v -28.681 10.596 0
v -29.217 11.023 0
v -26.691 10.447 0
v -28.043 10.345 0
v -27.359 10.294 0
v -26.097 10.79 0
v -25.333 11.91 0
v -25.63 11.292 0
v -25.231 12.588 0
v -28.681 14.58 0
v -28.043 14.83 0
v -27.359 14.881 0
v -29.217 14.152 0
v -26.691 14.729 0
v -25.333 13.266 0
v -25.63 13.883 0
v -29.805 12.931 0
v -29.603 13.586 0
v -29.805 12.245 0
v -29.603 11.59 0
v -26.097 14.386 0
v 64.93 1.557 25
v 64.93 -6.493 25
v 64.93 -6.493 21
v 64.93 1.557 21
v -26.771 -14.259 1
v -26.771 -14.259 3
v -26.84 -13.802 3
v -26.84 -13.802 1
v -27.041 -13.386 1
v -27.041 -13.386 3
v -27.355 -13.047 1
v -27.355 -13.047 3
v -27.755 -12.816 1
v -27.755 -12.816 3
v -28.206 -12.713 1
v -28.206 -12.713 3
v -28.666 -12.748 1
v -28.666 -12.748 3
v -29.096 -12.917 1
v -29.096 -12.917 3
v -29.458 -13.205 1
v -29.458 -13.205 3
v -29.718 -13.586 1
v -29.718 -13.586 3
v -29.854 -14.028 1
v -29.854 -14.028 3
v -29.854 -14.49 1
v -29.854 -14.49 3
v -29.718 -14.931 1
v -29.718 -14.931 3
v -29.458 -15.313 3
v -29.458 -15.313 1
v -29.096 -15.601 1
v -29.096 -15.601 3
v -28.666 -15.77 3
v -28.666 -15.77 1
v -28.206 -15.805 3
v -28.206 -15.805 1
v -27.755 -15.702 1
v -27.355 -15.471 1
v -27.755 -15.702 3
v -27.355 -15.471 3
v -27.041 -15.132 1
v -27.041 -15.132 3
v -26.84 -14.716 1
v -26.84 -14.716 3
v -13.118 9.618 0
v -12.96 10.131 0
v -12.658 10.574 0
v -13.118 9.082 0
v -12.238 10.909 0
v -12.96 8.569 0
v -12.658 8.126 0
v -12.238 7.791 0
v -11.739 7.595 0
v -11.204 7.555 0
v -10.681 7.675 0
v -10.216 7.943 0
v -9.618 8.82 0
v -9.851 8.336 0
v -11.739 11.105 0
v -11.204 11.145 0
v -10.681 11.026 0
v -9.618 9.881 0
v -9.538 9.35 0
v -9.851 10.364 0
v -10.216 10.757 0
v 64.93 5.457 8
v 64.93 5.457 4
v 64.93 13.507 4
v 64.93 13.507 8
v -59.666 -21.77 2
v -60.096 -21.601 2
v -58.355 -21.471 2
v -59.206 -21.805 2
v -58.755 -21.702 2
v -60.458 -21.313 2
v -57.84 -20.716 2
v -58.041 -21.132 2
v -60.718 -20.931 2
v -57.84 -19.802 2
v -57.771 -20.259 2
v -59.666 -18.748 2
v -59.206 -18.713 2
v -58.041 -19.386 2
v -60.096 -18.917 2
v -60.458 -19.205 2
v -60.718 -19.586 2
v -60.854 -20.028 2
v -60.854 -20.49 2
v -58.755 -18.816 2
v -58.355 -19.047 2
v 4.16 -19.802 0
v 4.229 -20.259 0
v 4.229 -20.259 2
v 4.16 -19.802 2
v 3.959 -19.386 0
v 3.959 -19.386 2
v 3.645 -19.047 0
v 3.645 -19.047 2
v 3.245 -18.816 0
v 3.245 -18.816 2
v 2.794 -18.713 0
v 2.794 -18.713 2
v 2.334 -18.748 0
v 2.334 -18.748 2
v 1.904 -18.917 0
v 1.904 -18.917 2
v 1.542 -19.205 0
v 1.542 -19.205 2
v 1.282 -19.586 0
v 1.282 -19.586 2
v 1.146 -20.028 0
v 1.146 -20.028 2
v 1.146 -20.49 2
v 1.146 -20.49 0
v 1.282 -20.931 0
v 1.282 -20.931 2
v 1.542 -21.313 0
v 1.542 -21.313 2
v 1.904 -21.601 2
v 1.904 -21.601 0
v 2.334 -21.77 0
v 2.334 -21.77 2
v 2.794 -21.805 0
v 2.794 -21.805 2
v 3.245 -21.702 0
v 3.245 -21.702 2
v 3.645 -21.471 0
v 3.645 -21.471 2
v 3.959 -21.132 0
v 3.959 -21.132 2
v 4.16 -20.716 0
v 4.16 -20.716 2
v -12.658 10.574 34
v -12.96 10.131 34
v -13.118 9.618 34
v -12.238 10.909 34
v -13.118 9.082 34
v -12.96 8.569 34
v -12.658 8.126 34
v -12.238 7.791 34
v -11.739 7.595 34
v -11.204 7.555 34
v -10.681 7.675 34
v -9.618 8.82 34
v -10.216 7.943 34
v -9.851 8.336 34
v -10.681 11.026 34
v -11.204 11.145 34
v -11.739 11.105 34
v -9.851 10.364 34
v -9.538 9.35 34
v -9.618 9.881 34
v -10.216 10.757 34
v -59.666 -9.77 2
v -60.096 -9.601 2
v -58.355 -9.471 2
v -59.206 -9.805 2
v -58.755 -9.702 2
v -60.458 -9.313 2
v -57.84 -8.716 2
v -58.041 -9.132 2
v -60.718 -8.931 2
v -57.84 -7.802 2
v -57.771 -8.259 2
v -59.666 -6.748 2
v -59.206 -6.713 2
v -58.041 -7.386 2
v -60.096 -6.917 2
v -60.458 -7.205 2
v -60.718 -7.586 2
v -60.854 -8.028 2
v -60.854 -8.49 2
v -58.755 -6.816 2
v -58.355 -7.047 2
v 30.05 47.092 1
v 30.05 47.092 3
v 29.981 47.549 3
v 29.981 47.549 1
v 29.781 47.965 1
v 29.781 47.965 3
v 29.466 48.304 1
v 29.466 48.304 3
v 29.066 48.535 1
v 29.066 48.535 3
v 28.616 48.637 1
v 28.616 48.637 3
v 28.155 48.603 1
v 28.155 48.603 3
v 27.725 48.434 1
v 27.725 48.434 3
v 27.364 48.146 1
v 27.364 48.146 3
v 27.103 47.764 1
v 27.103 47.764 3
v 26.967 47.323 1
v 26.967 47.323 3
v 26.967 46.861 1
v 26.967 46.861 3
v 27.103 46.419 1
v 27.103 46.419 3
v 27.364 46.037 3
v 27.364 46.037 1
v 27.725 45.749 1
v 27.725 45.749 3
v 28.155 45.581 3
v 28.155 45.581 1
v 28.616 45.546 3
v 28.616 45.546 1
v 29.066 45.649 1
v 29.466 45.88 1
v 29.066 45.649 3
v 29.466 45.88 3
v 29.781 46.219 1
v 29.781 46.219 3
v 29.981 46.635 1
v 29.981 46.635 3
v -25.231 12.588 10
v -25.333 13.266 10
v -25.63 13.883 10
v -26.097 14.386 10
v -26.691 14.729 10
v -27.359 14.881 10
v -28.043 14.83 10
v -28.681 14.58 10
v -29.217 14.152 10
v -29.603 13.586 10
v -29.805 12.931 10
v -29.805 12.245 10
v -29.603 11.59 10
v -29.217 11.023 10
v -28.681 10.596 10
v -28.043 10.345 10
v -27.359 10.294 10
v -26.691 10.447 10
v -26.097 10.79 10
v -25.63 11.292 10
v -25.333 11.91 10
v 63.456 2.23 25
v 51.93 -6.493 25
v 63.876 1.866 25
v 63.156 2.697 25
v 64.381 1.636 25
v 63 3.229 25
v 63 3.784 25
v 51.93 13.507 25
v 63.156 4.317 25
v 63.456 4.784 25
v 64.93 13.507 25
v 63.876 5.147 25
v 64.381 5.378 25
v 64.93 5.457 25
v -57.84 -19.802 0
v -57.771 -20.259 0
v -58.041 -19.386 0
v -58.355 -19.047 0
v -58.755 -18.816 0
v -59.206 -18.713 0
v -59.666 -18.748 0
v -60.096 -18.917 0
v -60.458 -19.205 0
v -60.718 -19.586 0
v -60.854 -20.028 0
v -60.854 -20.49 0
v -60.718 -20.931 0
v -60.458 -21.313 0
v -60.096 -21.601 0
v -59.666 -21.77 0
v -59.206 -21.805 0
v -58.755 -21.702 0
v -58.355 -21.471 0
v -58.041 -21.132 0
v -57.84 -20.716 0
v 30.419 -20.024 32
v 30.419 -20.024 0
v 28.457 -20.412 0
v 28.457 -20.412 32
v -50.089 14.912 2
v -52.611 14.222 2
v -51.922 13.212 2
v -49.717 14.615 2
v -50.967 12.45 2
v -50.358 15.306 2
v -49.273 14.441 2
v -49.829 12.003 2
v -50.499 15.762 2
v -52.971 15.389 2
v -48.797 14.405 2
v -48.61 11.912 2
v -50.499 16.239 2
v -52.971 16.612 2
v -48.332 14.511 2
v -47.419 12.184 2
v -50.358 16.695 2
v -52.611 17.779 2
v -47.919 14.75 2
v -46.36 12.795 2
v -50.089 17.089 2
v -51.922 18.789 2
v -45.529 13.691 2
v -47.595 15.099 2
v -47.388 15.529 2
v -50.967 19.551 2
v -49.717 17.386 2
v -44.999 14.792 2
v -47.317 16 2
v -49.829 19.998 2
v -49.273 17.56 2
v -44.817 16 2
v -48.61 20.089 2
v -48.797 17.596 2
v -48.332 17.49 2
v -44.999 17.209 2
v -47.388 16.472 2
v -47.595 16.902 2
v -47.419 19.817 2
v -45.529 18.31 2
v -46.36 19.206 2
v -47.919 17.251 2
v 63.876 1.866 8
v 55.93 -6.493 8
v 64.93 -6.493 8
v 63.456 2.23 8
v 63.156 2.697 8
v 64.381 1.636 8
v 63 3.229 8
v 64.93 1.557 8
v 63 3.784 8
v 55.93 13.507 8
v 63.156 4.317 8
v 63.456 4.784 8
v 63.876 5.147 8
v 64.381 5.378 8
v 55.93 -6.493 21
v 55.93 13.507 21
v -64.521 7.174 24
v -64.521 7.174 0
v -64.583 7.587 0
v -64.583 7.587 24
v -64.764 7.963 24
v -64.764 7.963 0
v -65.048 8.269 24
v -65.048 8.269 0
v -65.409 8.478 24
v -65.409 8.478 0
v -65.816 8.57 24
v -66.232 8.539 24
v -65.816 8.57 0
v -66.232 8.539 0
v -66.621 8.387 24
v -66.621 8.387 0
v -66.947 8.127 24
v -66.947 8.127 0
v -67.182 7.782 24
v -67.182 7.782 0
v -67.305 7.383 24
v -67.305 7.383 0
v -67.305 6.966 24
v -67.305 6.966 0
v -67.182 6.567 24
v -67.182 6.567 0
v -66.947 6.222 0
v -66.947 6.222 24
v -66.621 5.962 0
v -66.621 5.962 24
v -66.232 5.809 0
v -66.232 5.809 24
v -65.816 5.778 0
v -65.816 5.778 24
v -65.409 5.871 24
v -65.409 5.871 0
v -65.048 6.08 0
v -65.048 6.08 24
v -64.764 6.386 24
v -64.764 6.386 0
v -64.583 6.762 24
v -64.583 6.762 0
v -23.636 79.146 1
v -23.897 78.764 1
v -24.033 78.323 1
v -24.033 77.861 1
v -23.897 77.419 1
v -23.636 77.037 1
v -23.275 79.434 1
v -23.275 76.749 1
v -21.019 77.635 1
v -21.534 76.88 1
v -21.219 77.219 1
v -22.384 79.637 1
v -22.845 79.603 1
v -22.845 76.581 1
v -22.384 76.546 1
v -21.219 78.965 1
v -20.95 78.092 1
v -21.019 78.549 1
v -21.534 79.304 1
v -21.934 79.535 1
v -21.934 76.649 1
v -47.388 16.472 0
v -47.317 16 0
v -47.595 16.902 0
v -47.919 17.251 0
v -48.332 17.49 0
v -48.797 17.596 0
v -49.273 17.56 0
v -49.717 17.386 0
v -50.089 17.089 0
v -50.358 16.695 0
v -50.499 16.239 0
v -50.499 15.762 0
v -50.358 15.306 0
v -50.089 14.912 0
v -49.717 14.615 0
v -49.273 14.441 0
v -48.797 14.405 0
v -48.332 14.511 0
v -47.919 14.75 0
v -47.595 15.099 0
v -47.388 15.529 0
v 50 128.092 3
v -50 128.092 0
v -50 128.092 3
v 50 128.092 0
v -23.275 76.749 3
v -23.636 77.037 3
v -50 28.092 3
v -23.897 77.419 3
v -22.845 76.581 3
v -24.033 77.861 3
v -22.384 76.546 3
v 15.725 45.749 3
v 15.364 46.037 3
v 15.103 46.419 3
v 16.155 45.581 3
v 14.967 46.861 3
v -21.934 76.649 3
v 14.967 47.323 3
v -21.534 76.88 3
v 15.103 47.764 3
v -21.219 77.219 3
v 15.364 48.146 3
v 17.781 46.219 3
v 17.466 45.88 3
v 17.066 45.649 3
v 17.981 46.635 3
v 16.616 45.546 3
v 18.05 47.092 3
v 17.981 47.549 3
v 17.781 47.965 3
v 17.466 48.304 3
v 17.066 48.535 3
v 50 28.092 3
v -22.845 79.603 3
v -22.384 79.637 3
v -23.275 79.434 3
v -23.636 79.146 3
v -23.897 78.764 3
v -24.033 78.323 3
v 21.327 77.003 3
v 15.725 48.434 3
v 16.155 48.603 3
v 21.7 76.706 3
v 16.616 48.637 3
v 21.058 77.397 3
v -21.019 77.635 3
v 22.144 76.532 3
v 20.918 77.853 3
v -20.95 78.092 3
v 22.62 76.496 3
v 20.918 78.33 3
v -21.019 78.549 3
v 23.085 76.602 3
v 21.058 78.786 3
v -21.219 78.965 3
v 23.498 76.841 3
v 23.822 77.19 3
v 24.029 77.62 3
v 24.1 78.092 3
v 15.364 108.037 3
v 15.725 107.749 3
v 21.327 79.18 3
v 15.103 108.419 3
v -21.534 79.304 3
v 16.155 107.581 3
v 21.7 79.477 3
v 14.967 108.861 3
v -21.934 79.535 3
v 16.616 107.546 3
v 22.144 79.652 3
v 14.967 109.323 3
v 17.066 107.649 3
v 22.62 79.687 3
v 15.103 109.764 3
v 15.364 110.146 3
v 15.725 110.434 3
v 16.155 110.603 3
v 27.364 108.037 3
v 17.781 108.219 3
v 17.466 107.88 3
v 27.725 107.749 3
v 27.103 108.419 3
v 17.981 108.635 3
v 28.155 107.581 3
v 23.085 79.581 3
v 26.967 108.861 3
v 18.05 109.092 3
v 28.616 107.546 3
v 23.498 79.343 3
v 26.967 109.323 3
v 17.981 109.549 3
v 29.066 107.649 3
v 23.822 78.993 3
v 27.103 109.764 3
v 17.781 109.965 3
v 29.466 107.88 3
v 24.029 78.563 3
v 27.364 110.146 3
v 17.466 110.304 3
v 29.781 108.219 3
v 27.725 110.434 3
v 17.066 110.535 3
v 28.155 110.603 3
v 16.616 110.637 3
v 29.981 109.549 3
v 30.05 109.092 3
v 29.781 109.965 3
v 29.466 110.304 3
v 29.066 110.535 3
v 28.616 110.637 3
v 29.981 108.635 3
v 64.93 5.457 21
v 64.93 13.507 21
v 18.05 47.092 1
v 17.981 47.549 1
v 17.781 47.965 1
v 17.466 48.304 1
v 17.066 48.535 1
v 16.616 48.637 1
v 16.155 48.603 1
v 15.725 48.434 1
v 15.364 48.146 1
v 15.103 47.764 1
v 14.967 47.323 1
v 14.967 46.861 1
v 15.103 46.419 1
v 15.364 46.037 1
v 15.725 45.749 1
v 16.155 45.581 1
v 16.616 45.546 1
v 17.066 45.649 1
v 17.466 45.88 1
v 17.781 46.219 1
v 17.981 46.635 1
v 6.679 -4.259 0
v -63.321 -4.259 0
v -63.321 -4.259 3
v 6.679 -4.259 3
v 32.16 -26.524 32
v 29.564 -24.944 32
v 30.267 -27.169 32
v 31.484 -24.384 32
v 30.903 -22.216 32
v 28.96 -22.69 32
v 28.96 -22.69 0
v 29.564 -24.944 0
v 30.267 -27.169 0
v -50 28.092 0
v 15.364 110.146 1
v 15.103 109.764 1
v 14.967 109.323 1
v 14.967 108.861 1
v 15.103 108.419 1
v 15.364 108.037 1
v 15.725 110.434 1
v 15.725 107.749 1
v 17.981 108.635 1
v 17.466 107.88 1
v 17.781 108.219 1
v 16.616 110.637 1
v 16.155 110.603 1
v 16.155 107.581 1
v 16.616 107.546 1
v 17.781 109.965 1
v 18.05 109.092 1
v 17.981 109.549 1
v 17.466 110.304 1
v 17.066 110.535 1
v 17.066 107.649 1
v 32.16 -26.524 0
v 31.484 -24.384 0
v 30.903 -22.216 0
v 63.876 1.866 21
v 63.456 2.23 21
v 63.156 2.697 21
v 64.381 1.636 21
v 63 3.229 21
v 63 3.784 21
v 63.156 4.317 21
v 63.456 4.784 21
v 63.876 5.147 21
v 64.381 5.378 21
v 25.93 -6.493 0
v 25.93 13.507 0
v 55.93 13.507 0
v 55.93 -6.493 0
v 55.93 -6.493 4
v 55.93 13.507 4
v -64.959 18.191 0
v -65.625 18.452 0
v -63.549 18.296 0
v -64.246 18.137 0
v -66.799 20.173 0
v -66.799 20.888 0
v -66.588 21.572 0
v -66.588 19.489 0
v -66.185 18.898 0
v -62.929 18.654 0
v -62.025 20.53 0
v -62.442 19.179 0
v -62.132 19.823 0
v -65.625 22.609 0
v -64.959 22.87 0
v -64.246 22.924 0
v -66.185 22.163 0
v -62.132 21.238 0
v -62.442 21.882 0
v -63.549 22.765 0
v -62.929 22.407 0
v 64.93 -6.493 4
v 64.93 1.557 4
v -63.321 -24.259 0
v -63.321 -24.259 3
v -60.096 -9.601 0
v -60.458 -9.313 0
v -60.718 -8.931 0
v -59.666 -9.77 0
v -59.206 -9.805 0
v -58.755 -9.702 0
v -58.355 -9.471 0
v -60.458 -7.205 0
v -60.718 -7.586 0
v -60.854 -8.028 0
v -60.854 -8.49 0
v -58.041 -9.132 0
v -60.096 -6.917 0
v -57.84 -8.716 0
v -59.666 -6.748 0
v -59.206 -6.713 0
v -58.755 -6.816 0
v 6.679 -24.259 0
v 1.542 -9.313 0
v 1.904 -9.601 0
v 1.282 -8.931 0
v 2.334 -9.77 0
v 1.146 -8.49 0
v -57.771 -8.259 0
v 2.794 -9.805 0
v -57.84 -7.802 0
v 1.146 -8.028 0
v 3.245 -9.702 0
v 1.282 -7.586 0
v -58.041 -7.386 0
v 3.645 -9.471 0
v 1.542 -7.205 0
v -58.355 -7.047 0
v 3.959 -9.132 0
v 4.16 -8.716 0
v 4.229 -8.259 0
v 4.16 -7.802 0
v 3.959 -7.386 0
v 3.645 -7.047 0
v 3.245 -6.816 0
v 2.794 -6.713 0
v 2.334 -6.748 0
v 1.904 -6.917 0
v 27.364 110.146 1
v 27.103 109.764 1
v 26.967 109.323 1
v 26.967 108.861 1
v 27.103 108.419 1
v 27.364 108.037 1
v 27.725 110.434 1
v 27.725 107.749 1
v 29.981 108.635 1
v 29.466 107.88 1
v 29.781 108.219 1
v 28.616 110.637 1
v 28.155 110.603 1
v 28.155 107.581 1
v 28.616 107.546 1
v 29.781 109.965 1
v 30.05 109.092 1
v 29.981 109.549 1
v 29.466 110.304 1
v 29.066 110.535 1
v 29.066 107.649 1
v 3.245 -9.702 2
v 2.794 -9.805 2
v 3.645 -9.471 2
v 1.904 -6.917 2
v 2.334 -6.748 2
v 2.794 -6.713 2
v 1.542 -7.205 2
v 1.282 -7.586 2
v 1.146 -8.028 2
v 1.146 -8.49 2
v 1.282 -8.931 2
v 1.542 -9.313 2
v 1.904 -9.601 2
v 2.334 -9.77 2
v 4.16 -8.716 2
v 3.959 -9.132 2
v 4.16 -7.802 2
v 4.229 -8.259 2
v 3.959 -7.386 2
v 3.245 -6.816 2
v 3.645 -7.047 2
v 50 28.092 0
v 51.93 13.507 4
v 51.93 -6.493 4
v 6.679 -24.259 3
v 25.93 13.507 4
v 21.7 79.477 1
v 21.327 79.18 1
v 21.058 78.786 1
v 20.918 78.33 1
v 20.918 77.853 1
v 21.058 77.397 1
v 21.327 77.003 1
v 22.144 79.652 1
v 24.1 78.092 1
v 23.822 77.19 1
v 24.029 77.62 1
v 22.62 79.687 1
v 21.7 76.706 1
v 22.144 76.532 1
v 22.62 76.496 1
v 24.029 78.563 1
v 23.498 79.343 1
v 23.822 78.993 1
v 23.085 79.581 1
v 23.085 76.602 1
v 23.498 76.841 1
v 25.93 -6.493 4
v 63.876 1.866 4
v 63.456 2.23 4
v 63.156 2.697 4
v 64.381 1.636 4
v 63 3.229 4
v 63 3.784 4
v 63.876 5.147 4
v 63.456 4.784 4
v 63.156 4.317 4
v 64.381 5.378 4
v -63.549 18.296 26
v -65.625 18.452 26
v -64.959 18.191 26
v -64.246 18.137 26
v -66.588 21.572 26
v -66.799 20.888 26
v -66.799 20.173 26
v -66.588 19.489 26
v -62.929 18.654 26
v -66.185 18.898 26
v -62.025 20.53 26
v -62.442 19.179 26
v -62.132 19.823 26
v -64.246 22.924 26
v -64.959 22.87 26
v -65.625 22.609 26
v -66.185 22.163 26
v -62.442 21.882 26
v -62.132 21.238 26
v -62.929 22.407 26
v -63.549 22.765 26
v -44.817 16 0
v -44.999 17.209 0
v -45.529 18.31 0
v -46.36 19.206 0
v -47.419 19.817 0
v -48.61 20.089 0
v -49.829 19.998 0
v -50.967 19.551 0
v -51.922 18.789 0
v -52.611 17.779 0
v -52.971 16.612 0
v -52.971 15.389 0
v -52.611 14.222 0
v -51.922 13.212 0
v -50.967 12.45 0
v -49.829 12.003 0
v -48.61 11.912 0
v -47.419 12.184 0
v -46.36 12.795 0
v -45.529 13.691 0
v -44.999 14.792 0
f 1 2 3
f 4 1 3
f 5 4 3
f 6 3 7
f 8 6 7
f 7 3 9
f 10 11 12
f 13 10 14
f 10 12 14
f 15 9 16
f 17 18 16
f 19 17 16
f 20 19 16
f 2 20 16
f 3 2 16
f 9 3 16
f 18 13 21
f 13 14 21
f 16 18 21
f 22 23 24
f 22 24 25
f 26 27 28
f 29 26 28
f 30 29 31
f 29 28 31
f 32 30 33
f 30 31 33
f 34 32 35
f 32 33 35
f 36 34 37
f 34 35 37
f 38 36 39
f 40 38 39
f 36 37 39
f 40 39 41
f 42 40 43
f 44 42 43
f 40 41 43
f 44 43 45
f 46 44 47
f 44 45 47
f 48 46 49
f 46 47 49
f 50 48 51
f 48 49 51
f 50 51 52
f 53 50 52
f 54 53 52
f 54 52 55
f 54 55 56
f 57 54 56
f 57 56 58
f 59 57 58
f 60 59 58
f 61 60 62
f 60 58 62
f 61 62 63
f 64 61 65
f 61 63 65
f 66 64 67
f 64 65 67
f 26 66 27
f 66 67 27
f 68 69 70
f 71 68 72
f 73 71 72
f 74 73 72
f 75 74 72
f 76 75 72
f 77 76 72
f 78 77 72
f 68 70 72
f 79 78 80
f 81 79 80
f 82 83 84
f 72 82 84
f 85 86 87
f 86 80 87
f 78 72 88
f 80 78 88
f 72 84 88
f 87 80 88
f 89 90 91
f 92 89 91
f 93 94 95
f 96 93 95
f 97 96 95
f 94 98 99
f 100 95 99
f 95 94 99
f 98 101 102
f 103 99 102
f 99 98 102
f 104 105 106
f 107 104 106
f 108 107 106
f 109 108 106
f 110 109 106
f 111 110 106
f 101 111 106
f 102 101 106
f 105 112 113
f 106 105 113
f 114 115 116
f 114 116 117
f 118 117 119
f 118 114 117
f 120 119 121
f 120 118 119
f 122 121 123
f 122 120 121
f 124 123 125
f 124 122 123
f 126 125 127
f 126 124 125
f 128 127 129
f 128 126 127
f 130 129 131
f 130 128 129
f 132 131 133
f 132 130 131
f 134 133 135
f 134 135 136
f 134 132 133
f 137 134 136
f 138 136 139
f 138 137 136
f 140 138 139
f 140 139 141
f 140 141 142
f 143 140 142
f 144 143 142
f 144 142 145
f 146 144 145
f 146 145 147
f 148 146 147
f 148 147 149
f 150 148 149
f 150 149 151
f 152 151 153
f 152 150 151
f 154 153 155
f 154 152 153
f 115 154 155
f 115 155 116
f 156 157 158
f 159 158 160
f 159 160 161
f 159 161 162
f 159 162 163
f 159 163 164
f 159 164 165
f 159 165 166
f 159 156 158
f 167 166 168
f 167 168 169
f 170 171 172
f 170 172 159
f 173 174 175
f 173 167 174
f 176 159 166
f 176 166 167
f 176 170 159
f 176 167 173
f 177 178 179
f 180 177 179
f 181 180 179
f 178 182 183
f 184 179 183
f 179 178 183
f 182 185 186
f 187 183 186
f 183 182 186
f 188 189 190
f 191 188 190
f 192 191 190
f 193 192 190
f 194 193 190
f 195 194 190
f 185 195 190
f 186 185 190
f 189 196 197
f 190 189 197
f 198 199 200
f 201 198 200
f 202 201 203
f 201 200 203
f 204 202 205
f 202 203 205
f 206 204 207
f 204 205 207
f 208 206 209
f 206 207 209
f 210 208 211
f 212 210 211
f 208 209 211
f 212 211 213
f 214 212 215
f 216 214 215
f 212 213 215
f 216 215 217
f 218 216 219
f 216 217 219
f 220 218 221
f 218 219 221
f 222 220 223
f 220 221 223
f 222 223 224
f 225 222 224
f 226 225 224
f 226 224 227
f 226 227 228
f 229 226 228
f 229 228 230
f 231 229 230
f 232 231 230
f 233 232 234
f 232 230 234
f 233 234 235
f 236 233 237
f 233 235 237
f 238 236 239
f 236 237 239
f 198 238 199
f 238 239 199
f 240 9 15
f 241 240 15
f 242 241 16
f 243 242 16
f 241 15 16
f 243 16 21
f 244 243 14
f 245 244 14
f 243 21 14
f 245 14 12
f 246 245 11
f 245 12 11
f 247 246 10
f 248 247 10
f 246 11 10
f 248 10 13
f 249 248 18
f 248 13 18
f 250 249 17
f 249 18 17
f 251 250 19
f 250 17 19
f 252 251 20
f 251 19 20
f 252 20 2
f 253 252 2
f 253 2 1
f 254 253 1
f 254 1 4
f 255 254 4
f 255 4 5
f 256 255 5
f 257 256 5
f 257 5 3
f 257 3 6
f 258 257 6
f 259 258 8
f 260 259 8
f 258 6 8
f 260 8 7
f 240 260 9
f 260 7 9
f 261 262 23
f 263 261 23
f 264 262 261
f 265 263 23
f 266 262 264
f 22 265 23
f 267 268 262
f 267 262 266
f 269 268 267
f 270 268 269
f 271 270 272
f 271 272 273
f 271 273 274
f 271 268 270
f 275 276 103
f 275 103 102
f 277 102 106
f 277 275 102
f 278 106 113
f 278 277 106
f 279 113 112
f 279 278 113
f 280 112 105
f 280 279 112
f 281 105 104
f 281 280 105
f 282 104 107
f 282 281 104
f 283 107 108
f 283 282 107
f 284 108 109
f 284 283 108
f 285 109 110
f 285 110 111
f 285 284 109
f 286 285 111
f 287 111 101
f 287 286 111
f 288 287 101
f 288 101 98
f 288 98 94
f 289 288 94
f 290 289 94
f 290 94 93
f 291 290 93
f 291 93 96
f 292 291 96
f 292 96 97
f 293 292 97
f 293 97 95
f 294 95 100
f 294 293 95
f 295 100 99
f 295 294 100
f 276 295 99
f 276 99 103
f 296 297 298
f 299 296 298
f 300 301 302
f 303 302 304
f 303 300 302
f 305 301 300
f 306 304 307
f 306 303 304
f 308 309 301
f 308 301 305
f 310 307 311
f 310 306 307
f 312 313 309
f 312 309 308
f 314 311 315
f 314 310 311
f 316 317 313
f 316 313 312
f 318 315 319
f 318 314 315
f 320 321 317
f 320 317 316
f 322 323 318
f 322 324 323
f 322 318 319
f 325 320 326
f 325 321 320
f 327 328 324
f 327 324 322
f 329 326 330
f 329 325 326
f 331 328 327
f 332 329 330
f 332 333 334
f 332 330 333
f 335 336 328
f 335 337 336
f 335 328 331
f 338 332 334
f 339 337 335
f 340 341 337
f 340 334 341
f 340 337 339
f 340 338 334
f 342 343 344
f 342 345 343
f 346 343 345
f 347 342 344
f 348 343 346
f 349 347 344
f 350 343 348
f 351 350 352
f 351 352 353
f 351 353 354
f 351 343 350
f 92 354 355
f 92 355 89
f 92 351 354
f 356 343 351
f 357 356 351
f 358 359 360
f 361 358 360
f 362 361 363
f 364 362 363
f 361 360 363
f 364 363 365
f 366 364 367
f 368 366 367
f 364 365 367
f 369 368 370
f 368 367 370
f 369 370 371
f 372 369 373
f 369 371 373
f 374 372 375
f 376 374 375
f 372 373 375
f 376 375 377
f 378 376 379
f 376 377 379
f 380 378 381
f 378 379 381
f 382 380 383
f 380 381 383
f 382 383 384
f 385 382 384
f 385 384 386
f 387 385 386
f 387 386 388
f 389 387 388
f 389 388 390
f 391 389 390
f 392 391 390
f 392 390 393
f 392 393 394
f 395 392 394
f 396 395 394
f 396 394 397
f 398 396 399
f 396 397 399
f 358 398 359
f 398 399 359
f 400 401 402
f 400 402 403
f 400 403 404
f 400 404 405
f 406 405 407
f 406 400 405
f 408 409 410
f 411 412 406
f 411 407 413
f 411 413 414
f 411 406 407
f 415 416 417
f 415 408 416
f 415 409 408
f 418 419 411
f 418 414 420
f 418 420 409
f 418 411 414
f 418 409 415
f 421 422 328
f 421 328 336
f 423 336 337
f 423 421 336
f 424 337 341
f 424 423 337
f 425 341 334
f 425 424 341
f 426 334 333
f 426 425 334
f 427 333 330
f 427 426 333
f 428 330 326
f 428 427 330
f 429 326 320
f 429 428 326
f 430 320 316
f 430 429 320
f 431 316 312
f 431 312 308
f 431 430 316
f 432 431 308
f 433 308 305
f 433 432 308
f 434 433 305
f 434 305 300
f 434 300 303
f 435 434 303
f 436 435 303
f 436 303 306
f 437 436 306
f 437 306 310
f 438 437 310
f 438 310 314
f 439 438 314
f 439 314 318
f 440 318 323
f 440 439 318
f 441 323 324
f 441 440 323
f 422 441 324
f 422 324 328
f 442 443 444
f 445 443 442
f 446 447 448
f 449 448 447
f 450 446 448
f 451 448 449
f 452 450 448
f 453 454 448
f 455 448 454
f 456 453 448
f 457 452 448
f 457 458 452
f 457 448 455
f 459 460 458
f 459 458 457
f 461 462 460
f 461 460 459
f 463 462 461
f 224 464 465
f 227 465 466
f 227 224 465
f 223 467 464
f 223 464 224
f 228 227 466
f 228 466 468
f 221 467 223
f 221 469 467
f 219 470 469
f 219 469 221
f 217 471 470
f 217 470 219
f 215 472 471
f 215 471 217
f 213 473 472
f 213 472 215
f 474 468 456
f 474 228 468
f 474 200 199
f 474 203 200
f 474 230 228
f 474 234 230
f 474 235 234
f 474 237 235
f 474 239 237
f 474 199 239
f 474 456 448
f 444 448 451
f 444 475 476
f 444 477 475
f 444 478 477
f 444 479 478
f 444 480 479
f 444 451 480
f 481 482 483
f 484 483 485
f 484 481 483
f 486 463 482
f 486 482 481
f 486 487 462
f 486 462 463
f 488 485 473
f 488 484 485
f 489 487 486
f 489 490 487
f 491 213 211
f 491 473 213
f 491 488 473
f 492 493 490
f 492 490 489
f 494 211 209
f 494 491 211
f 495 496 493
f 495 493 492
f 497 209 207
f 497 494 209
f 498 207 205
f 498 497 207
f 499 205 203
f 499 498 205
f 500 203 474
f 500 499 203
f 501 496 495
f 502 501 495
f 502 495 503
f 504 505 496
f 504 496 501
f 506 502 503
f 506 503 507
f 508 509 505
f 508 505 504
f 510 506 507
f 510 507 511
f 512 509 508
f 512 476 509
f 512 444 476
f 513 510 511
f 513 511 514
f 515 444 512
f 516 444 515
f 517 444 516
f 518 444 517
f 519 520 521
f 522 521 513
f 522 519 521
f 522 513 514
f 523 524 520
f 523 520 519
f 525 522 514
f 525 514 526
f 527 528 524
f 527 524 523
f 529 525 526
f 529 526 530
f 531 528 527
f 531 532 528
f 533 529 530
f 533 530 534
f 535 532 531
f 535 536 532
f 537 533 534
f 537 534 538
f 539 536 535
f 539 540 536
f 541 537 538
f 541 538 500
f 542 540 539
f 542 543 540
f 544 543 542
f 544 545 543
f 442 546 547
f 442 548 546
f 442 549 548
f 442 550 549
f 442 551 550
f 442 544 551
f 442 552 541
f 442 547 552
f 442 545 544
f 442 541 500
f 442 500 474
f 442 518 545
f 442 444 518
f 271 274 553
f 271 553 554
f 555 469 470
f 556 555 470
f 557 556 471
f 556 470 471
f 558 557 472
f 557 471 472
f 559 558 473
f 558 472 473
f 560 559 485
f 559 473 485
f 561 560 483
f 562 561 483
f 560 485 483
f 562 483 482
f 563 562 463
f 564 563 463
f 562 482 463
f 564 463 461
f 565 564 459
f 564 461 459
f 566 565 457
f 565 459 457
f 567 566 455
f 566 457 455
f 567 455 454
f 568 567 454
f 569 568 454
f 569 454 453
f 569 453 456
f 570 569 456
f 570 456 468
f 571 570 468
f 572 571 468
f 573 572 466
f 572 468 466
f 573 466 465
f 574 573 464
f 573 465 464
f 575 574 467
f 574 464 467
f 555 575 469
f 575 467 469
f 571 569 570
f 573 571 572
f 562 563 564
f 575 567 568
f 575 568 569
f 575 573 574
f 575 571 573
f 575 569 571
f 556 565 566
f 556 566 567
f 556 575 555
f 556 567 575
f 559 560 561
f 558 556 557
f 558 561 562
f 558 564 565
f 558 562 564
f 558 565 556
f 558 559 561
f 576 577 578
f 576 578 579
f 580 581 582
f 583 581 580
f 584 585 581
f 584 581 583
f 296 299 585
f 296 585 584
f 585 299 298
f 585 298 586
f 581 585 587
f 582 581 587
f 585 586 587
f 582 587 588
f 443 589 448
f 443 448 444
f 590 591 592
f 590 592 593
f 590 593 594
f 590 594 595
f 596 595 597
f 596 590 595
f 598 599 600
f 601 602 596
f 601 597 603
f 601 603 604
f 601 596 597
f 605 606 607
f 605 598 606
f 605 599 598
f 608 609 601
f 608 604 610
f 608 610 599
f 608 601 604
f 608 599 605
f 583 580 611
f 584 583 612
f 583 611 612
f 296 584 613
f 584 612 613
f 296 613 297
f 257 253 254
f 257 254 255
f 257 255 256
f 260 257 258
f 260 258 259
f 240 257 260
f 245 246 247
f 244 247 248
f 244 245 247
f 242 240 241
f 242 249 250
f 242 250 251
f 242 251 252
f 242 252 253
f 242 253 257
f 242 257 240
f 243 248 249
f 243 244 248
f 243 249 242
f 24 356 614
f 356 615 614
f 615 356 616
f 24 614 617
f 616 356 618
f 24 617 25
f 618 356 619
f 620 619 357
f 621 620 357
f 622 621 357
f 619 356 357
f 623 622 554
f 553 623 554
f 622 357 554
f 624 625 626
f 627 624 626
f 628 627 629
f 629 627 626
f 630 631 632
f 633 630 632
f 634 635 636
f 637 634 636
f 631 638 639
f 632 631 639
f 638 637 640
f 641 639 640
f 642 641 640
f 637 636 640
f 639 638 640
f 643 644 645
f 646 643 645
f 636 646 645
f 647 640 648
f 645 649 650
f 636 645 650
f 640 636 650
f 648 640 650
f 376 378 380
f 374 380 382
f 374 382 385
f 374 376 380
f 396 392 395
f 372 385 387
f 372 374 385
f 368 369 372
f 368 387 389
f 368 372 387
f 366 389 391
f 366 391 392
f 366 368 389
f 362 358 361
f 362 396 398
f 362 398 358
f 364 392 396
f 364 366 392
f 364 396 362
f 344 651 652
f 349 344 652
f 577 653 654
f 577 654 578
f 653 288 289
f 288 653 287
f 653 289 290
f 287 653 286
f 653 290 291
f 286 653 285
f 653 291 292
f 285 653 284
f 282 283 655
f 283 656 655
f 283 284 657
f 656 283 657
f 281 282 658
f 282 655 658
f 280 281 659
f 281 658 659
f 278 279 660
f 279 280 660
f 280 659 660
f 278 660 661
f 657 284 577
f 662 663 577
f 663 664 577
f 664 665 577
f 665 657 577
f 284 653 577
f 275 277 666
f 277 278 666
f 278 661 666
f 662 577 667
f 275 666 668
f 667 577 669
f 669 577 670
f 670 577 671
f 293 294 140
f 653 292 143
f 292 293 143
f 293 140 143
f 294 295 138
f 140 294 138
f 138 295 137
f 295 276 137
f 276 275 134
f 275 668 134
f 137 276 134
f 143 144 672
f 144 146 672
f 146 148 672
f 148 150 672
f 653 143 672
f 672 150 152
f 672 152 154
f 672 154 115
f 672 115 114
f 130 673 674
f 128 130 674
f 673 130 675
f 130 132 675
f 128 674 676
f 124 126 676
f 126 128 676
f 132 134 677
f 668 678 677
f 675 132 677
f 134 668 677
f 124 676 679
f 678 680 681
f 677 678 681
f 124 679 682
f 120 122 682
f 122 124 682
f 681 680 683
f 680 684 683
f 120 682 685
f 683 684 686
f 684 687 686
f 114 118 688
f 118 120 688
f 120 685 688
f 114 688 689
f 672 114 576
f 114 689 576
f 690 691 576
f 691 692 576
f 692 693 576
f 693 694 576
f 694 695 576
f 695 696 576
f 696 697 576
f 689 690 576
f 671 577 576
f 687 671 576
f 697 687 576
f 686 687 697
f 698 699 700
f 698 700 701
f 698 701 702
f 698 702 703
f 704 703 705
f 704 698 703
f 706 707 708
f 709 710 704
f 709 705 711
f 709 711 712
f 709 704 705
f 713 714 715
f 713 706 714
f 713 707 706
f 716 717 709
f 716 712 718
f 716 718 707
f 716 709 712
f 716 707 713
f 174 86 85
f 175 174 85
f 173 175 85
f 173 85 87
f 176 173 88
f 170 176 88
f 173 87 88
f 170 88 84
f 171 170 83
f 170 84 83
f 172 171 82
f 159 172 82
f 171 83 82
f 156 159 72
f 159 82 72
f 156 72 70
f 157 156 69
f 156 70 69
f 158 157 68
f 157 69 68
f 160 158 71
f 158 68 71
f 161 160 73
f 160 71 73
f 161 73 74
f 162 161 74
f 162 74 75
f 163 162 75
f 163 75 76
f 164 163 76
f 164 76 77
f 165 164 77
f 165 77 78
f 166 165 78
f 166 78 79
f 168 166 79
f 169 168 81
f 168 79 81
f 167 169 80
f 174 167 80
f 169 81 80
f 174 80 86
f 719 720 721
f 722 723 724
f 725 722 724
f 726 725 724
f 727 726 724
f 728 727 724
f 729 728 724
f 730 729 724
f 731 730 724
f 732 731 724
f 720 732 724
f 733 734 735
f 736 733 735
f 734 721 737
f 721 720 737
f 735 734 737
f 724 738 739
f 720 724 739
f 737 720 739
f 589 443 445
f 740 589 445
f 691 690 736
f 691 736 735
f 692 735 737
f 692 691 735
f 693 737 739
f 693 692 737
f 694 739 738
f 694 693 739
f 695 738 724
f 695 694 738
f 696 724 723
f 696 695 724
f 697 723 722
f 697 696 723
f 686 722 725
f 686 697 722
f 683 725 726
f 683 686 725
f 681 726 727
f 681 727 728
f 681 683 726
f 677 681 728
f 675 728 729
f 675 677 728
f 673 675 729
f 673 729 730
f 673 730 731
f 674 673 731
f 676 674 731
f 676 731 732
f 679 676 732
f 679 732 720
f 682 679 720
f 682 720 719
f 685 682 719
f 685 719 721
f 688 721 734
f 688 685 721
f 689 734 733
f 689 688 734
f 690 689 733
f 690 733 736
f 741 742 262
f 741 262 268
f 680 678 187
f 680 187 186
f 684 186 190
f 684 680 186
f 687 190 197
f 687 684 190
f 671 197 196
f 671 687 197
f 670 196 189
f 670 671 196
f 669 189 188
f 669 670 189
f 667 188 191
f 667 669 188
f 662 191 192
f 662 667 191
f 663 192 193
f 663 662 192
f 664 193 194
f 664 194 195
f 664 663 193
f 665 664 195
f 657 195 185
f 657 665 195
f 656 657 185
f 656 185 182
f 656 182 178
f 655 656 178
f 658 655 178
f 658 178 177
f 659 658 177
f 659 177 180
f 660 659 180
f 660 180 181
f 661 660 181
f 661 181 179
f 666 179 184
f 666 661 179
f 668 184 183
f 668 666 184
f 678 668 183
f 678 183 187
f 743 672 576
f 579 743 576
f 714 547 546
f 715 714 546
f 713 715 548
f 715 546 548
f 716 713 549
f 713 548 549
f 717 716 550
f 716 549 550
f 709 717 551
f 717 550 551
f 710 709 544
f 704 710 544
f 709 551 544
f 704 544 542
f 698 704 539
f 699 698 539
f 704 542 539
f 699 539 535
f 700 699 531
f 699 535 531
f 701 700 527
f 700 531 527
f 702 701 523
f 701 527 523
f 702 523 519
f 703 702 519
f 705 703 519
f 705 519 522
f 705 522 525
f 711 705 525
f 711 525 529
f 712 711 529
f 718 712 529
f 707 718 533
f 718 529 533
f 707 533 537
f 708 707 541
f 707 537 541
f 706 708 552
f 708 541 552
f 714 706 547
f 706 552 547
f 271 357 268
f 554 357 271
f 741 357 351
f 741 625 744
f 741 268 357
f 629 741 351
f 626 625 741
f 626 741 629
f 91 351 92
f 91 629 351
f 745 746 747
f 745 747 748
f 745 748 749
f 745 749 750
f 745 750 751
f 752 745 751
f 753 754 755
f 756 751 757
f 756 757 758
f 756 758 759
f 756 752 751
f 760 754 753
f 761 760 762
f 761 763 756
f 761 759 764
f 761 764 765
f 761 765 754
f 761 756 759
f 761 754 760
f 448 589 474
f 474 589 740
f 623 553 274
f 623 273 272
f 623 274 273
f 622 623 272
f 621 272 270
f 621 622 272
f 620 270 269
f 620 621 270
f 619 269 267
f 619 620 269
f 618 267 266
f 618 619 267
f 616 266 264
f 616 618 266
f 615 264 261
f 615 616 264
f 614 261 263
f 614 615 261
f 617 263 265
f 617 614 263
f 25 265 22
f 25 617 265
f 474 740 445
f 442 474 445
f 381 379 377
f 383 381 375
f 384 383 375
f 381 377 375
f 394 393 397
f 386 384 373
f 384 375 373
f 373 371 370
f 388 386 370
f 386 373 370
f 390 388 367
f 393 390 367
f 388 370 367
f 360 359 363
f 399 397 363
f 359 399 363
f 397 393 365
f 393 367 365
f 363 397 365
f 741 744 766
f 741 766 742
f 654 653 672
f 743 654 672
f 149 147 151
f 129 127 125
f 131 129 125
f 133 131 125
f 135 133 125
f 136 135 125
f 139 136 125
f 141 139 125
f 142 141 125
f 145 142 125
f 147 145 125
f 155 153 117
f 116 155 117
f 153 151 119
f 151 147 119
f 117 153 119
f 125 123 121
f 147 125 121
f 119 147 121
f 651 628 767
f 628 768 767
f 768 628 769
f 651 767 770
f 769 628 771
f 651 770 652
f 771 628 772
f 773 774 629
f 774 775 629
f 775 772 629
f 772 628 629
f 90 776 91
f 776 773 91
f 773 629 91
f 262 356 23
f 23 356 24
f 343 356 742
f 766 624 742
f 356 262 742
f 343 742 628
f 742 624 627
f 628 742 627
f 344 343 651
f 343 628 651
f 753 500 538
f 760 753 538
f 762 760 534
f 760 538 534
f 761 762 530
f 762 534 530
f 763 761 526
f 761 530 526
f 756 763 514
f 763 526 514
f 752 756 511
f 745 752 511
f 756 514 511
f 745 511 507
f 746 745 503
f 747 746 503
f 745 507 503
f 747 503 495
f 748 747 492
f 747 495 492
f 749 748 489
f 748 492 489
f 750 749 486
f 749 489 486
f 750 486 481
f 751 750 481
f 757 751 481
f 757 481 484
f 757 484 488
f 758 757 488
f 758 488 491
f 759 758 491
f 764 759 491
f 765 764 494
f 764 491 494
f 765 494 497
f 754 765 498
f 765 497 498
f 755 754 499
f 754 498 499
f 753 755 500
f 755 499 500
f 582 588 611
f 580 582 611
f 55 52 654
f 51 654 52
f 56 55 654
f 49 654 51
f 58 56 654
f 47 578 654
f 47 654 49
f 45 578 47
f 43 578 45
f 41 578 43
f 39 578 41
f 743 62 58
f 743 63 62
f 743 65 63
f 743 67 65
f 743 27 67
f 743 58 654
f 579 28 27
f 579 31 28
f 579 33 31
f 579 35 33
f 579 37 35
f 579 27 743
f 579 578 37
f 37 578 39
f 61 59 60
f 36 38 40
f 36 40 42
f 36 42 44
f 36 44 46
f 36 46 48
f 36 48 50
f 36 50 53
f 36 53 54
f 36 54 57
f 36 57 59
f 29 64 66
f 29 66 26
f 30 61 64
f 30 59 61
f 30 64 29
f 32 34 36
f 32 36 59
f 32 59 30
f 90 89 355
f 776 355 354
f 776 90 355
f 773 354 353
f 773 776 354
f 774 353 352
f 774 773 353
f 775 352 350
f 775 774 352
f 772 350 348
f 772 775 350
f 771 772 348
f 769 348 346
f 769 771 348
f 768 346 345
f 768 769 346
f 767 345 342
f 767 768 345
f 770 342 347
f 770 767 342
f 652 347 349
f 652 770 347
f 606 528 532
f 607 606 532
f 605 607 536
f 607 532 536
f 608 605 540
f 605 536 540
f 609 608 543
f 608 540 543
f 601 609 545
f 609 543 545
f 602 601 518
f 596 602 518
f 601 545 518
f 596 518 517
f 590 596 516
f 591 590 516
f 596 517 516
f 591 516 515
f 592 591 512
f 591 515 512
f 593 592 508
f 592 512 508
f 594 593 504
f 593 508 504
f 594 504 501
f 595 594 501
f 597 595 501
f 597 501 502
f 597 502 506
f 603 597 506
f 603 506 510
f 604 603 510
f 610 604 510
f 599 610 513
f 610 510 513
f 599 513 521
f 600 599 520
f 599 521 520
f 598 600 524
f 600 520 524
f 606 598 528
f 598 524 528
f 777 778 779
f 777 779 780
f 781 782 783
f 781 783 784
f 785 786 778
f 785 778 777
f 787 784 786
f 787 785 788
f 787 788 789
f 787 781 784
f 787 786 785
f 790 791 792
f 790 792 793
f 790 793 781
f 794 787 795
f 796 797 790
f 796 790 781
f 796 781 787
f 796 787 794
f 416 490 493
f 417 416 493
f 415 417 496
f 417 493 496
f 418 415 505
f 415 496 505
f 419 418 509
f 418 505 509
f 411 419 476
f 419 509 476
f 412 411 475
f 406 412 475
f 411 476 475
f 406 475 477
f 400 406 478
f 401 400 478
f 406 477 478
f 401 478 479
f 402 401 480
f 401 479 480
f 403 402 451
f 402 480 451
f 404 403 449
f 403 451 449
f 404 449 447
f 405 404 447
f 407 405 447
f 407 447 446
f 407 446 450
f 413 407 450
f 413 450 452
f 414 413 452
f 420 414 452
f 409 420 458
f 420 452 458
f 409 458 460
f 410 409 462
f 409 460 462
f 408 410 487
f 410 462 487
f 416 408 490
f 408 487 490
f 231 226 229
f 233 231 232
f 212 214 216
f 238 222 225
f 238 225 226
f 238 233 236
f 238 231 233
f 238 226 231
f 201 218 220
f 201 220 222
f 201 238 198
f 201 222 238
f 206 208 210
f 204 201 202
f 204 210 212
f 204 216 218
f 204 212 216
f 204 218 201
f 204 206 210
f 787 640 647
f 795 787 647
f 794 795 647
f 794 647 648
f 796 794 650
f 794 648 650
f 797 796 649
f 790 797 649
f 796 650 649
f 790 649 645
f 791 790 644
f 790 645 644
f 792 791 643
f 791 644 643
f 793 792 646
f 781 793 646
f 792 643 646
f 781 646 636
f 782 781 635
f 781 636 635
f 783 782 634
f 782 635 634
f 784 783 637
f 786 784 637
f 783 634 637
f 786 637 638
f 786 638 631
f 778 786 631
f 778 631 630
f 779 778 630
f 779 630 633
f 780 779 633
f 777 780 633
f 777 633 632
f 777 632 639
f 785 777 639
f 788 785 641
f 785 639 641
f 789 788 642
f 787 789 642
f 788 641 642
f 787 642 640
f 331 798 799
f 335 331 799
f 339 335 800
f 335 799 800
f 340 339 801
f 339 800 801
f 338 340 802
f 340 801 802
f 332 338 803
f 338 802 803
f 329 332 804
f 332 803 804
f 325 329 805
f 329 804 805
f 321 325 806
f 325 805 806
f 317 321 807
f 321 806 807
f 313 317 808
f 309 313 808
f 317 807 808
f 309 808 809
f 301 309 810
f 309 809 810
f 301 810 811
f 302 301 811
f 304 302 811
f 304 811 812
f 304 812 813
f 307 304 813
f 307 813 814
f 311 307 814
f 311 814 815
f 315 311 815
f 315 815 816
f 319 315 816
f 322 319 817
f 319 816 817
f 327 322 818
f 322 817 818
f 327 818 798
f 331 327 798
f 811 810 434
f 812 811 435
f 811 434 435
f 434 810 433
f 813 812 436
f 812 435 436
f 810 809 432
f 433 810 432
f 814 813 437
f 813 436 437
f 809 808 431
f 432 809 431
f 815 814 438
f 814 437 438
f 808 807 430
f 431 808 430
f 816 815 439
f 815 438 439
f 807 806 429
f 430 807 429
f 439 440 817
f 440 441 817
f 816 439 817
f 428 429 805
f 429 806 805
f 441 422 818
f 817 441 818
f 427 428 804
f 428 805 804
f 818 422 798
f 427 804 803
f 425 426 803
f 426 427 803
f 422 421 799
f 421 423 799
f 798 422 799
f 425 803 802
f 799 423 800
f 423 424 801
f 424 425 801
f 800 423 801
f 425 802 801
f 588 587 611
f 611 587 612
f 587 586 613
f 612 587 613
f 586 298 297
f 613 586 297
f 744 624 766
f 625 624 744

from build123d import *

# Parameters (mm, degrees)
F0_W      = 100
F0_H      = 100
F1_DEPTH  = 3
F2_R      = 1.55
F2_R_2    = 1.6
F3_DEPTH  = 2
F0_R      = 2.4
F4_DEPTH  = 26
F0_R_2    = 4.1
F0_R_3    = 1.6
F5_DEPTH  = 2
F0_W_2    = 70
F0_H_2    = 20
F0_R_4    = 1.55
F6_DEPTH  = 3
F7_DEPTH  = 2
F8_R      = 1.55
F9_DEPTH  = 2
F10_DEPTH = 2
F0_R_5    = 2.3
F11_DEPTH = 10
F0_R_6    = 1.4
F12_DEPTH = 24
F0_R_7    = 1.8
F13_DEPTH = 34
F0_W_3    = 30
F14_DEPTH = 4
F15_W     = 4
F15_H     = 20
F16_DEPTH = 21
F17_W     = 13
F17_H     = 20
F18_DEPTH = 4
F19_DEPTH = 4
F20_DEPTH = 30.001
F21_DEPTH = 32


with BuildPart() as f1:
    # F0 (on Top) → F1 (new body)
    with BuildSketch(Plane.XY):
        with Locations((0, 78.091673553)):
            Rectangle(F0_W, F0_H)
    extrude(amount=F1_DEPTH)

    # F2 (on face) → F3 (cut)
    with BuildSketch(Plane.XY.offset(3)):
        with Locations((-22.5, 78.091673553)):
            Circle(F2_R)
        with Locations((22.5, 78.091673553)):
            Circle(F2_R_2)
    extrude(amount=-F3_DEPTH, mode=Mode.SUBTRACT)

    # F2 (on face) → F10 (cut)
    with BuildSketch(Plane.XY.offset(3)):
        with Locations((28.5, 109.091673553)):
            Circle(F2_R)
        with Locations((16.5, 109.091673553)):
            Circle(F2_R)
        with Locations((16.5, 47.091673553)):
            Circle(F2_R)
        with Locations((28.5, 47.091673553)):
            Circle(F2_R)
    extrude(amount=-F10_DEPTH, mode=Mode.SUBTRACT)


with BuildPart() as f4:
    # F0 (on Top) → F4 (new body)
    with BuildSketch(Plane.XY):
        with Locations((-64.4254460931, 20.5304846168)):
            Circle(F0_R)
    extrude(amount=F4_DEPTH)


with BuildPart() as f5:
    # F0 (on Top) → F5 (new body)
    with BuildSketch(Plane.XY):
        with Locations((-48.9166043699, 16.0004515201)):
            Circle(F0_R_2)
        with Locations((-48.9166043699, 16.0004515201)):
            Circle(F0_R_3, mode=Mode.SUBTRACT)
    extrude(amount=F5_DEPTH)


with BuildPart() as f6:
    # F0 (on Top) → F6 (new body)
    with BuildSketch(Plane.XY):
        with Locations((-28.3213892579, -14.2588720098)):
            Rectangle(F0_W_2, F0_H_2)
        with Locations((-59.3213892579, -20.2588720098)):
            Circle(F0_R_4, mode=Mode.SUBTRACT)
        with Locations((-59.3213892579, -8.2588720098)):
            Circle(F0_R_4, mode=Mode.SUBTRACT)
        with Locations((2.6786107421, -20.2588720098)):
            Circle(F0_R_4, mode=Mode.SUBTRACT)
        with Locations((2.6786107421, -8.2588720098)):
            Circle(F0_R_4, mode=Mode.SUBTRACT)
        with Locations((-59.3213892579, -8.2588720098)):
            Circle(F0_R_4)
        with Locations((-59.3213892579, -20.2588720098)):
            Circle(F0_R_4)
        with Locations((2.6786107421, -8.2588720098)):
            Circle(F0_R_4)
        with Locations((2.6786107421, -20.2588720098)):
            Circle(F0_R_4)
    extrude(amount=F6_DEPTH)

    # F0 (on Top) → F7 (cut)
    with BuildSketch(Plane.XY):
        with Locations((2.6786107421, -8.2588720098)):
            Circle(F0_R_4)
        with Locations((2.6786107421, -20.2588720098)):
            Circle(F0_R_4)
        with Locations((-59.3213892579, -8.2588720098)):
            Circle(F0_R_4)
        with Locations((-59.3213892579, -20.2588720098)):
            Circle(F0_R_4)
    extrude(amount=F7_DEPTH, mode=Mode.SUBTRACT)

    # F8 (on face) → F9 (cut)
    with BuildSketch(Plane.XY.offset(3)):
        with Locations((-28.3213892579, -14.2588720098)):
            Circle(F8_R)
    extrude(amount=-F9_DEPTH, mode=Mode.SUBTRACT)


with BuildPart() as f11:
    # F0 (on Top) → F11 (new body)
    with BuildSketch(Plane.XY):
        with Locations((-27.5307968259, 12.5877708197)):
            Circle(F0_R_5)
    extrude(amount=F11_DEPTH)


with BuildPart() as f12:
    # F0 (on Top) → F12 (new body)
    with BuildSketch(Plane.XY):
        with Locations((-65.9205764532, 7.1743540466)):
            Circle(F0_R_6)
    extrude(amount=F12_DEPTH)


with BuildPart() as f13:
    # F0 (on Top) → F13 (new body)
    with BuildSketch(Plane.XY):
        with Locations((-11.3382367417, 9.3501862139)):
            Circle(F0_R_7)
    extrude(amount=F13_DEPTH)


with BuildPart() as f14:
    # F0 (on Top) → F14 (new body)
    with BuildSketch(Plane.XY):
        with Locations((40.9300172329, 3.5069335625)):
            Rectangle(F0_W_3, F0_H_2)
    extrude(amount=F14_DEPTH)

    # F15 (on face) → F16 (join)
    with BuildSketch(Plane.XY.offset(4)):
        with Locations((53.9300172329, 3.5069335625)):
            Rectangle(F15_W, F15_H)
    extrude(amount=F16_DEPTH)

    # F17 (on face) → F18 (join)
    with BuildSketch(Plane.XY.offset(25)):
        with Locations((58.4300172329, 3.5069335625)):
            Rectangle(F17_W, F17_H)
    extrude(amount=-F18_DEPTH)

    # F15 (on face) → F19 (join)
    with BuildSketch(Plane.XY.offset(4)):
        with BuildLine():
            Line((64.9300172329, 13.5069335625), (55.9300172329, 13.5069335625))
            Line((55.9300172329, 13.5069335625), (55.9300172329, -6.4930664375))
            Line((55.9300172329, -6.4930664375), (64.9300172329, -6.4930664375))
            Line((64.9300172329, -6.4930664375), (64.9300172329, 1.5569335625))
            ThreePointArc((64.9300172329, 1.5569335625), (62.9800172329, 3.5069335625), (64.9300172329, 5.4569335625))
            Line((64.9300172329, 5.4569335625), (64.9300172329, 13.5069335625))
        make_face()
        with BuildLine():
            Line((64.9300172329, 1.5569335625), (64.9300172329, 5.4569335625))
            ThreePointArc((64.9300172329, 5.4569335625), (62.9800172329, 3.5069335625), (64.9300172329, 1.5569335625))
        make_face()
    extrude(amount=F19_DEPTH)

    # F15 (on face) → F20 (cut, through all)
    with BuildSketch(Plane.XY.offset(4)):
        with BuildLine():
            Line((64.9300172329, 1.5569335625), (64.9300172329, 5.4569335625))
            ThreePointArc((64.9300172329, 5.4569335625), (62.9800172329, 3.5069335625), (64.9300172329, 1.5569335625))
        make_face()
        with BuildLine():
            ThreePointArc((66.8800172329, 3.5069335625), (66.3088754562, 4.8857917858), (64.9300172329, 5.4569335625))
            Line((64.9300172329, 5.4569335625), (64.9300172329, 1.5569335625))
            ThreePointArc((64.9300172329, 1.5569335625), (66.3088754562, 2.1280753391), (66.8800172329, 3.5069335625))
        make_face()
    extrude(amount=F20_DEPTH, mode=Mode.SUBTRACT)


with BuildPart() as f21:
    # F0 (on Top) → F21 (new body)
    with BuildSketch(Plane.XY):
        with BuildLine():
            ThreePointArc((32.1604046999, -26.5239069303), (31.1810598315, -23.3029801318), (30.4187339674, -20.0239032664))
            Line((30.4187339674, -20.0239032664), (28.456657675, -20.4115327583))
            ThreePointArc((28.456657675, -20.4115327583), (29.249208179, -23.820618222), (30.2673820406, -27.1692480892))
            Line((30.2673820406, -27.1692480892), (32.1604046999, -26.5239069303))
        make_face()
    extrude(amount=F21_DEPTH)


solid = Compound([f1.part, f4.part, f5.part, f6.part, f11.part, f12.part, f13.part, f14.part, f21.part])
